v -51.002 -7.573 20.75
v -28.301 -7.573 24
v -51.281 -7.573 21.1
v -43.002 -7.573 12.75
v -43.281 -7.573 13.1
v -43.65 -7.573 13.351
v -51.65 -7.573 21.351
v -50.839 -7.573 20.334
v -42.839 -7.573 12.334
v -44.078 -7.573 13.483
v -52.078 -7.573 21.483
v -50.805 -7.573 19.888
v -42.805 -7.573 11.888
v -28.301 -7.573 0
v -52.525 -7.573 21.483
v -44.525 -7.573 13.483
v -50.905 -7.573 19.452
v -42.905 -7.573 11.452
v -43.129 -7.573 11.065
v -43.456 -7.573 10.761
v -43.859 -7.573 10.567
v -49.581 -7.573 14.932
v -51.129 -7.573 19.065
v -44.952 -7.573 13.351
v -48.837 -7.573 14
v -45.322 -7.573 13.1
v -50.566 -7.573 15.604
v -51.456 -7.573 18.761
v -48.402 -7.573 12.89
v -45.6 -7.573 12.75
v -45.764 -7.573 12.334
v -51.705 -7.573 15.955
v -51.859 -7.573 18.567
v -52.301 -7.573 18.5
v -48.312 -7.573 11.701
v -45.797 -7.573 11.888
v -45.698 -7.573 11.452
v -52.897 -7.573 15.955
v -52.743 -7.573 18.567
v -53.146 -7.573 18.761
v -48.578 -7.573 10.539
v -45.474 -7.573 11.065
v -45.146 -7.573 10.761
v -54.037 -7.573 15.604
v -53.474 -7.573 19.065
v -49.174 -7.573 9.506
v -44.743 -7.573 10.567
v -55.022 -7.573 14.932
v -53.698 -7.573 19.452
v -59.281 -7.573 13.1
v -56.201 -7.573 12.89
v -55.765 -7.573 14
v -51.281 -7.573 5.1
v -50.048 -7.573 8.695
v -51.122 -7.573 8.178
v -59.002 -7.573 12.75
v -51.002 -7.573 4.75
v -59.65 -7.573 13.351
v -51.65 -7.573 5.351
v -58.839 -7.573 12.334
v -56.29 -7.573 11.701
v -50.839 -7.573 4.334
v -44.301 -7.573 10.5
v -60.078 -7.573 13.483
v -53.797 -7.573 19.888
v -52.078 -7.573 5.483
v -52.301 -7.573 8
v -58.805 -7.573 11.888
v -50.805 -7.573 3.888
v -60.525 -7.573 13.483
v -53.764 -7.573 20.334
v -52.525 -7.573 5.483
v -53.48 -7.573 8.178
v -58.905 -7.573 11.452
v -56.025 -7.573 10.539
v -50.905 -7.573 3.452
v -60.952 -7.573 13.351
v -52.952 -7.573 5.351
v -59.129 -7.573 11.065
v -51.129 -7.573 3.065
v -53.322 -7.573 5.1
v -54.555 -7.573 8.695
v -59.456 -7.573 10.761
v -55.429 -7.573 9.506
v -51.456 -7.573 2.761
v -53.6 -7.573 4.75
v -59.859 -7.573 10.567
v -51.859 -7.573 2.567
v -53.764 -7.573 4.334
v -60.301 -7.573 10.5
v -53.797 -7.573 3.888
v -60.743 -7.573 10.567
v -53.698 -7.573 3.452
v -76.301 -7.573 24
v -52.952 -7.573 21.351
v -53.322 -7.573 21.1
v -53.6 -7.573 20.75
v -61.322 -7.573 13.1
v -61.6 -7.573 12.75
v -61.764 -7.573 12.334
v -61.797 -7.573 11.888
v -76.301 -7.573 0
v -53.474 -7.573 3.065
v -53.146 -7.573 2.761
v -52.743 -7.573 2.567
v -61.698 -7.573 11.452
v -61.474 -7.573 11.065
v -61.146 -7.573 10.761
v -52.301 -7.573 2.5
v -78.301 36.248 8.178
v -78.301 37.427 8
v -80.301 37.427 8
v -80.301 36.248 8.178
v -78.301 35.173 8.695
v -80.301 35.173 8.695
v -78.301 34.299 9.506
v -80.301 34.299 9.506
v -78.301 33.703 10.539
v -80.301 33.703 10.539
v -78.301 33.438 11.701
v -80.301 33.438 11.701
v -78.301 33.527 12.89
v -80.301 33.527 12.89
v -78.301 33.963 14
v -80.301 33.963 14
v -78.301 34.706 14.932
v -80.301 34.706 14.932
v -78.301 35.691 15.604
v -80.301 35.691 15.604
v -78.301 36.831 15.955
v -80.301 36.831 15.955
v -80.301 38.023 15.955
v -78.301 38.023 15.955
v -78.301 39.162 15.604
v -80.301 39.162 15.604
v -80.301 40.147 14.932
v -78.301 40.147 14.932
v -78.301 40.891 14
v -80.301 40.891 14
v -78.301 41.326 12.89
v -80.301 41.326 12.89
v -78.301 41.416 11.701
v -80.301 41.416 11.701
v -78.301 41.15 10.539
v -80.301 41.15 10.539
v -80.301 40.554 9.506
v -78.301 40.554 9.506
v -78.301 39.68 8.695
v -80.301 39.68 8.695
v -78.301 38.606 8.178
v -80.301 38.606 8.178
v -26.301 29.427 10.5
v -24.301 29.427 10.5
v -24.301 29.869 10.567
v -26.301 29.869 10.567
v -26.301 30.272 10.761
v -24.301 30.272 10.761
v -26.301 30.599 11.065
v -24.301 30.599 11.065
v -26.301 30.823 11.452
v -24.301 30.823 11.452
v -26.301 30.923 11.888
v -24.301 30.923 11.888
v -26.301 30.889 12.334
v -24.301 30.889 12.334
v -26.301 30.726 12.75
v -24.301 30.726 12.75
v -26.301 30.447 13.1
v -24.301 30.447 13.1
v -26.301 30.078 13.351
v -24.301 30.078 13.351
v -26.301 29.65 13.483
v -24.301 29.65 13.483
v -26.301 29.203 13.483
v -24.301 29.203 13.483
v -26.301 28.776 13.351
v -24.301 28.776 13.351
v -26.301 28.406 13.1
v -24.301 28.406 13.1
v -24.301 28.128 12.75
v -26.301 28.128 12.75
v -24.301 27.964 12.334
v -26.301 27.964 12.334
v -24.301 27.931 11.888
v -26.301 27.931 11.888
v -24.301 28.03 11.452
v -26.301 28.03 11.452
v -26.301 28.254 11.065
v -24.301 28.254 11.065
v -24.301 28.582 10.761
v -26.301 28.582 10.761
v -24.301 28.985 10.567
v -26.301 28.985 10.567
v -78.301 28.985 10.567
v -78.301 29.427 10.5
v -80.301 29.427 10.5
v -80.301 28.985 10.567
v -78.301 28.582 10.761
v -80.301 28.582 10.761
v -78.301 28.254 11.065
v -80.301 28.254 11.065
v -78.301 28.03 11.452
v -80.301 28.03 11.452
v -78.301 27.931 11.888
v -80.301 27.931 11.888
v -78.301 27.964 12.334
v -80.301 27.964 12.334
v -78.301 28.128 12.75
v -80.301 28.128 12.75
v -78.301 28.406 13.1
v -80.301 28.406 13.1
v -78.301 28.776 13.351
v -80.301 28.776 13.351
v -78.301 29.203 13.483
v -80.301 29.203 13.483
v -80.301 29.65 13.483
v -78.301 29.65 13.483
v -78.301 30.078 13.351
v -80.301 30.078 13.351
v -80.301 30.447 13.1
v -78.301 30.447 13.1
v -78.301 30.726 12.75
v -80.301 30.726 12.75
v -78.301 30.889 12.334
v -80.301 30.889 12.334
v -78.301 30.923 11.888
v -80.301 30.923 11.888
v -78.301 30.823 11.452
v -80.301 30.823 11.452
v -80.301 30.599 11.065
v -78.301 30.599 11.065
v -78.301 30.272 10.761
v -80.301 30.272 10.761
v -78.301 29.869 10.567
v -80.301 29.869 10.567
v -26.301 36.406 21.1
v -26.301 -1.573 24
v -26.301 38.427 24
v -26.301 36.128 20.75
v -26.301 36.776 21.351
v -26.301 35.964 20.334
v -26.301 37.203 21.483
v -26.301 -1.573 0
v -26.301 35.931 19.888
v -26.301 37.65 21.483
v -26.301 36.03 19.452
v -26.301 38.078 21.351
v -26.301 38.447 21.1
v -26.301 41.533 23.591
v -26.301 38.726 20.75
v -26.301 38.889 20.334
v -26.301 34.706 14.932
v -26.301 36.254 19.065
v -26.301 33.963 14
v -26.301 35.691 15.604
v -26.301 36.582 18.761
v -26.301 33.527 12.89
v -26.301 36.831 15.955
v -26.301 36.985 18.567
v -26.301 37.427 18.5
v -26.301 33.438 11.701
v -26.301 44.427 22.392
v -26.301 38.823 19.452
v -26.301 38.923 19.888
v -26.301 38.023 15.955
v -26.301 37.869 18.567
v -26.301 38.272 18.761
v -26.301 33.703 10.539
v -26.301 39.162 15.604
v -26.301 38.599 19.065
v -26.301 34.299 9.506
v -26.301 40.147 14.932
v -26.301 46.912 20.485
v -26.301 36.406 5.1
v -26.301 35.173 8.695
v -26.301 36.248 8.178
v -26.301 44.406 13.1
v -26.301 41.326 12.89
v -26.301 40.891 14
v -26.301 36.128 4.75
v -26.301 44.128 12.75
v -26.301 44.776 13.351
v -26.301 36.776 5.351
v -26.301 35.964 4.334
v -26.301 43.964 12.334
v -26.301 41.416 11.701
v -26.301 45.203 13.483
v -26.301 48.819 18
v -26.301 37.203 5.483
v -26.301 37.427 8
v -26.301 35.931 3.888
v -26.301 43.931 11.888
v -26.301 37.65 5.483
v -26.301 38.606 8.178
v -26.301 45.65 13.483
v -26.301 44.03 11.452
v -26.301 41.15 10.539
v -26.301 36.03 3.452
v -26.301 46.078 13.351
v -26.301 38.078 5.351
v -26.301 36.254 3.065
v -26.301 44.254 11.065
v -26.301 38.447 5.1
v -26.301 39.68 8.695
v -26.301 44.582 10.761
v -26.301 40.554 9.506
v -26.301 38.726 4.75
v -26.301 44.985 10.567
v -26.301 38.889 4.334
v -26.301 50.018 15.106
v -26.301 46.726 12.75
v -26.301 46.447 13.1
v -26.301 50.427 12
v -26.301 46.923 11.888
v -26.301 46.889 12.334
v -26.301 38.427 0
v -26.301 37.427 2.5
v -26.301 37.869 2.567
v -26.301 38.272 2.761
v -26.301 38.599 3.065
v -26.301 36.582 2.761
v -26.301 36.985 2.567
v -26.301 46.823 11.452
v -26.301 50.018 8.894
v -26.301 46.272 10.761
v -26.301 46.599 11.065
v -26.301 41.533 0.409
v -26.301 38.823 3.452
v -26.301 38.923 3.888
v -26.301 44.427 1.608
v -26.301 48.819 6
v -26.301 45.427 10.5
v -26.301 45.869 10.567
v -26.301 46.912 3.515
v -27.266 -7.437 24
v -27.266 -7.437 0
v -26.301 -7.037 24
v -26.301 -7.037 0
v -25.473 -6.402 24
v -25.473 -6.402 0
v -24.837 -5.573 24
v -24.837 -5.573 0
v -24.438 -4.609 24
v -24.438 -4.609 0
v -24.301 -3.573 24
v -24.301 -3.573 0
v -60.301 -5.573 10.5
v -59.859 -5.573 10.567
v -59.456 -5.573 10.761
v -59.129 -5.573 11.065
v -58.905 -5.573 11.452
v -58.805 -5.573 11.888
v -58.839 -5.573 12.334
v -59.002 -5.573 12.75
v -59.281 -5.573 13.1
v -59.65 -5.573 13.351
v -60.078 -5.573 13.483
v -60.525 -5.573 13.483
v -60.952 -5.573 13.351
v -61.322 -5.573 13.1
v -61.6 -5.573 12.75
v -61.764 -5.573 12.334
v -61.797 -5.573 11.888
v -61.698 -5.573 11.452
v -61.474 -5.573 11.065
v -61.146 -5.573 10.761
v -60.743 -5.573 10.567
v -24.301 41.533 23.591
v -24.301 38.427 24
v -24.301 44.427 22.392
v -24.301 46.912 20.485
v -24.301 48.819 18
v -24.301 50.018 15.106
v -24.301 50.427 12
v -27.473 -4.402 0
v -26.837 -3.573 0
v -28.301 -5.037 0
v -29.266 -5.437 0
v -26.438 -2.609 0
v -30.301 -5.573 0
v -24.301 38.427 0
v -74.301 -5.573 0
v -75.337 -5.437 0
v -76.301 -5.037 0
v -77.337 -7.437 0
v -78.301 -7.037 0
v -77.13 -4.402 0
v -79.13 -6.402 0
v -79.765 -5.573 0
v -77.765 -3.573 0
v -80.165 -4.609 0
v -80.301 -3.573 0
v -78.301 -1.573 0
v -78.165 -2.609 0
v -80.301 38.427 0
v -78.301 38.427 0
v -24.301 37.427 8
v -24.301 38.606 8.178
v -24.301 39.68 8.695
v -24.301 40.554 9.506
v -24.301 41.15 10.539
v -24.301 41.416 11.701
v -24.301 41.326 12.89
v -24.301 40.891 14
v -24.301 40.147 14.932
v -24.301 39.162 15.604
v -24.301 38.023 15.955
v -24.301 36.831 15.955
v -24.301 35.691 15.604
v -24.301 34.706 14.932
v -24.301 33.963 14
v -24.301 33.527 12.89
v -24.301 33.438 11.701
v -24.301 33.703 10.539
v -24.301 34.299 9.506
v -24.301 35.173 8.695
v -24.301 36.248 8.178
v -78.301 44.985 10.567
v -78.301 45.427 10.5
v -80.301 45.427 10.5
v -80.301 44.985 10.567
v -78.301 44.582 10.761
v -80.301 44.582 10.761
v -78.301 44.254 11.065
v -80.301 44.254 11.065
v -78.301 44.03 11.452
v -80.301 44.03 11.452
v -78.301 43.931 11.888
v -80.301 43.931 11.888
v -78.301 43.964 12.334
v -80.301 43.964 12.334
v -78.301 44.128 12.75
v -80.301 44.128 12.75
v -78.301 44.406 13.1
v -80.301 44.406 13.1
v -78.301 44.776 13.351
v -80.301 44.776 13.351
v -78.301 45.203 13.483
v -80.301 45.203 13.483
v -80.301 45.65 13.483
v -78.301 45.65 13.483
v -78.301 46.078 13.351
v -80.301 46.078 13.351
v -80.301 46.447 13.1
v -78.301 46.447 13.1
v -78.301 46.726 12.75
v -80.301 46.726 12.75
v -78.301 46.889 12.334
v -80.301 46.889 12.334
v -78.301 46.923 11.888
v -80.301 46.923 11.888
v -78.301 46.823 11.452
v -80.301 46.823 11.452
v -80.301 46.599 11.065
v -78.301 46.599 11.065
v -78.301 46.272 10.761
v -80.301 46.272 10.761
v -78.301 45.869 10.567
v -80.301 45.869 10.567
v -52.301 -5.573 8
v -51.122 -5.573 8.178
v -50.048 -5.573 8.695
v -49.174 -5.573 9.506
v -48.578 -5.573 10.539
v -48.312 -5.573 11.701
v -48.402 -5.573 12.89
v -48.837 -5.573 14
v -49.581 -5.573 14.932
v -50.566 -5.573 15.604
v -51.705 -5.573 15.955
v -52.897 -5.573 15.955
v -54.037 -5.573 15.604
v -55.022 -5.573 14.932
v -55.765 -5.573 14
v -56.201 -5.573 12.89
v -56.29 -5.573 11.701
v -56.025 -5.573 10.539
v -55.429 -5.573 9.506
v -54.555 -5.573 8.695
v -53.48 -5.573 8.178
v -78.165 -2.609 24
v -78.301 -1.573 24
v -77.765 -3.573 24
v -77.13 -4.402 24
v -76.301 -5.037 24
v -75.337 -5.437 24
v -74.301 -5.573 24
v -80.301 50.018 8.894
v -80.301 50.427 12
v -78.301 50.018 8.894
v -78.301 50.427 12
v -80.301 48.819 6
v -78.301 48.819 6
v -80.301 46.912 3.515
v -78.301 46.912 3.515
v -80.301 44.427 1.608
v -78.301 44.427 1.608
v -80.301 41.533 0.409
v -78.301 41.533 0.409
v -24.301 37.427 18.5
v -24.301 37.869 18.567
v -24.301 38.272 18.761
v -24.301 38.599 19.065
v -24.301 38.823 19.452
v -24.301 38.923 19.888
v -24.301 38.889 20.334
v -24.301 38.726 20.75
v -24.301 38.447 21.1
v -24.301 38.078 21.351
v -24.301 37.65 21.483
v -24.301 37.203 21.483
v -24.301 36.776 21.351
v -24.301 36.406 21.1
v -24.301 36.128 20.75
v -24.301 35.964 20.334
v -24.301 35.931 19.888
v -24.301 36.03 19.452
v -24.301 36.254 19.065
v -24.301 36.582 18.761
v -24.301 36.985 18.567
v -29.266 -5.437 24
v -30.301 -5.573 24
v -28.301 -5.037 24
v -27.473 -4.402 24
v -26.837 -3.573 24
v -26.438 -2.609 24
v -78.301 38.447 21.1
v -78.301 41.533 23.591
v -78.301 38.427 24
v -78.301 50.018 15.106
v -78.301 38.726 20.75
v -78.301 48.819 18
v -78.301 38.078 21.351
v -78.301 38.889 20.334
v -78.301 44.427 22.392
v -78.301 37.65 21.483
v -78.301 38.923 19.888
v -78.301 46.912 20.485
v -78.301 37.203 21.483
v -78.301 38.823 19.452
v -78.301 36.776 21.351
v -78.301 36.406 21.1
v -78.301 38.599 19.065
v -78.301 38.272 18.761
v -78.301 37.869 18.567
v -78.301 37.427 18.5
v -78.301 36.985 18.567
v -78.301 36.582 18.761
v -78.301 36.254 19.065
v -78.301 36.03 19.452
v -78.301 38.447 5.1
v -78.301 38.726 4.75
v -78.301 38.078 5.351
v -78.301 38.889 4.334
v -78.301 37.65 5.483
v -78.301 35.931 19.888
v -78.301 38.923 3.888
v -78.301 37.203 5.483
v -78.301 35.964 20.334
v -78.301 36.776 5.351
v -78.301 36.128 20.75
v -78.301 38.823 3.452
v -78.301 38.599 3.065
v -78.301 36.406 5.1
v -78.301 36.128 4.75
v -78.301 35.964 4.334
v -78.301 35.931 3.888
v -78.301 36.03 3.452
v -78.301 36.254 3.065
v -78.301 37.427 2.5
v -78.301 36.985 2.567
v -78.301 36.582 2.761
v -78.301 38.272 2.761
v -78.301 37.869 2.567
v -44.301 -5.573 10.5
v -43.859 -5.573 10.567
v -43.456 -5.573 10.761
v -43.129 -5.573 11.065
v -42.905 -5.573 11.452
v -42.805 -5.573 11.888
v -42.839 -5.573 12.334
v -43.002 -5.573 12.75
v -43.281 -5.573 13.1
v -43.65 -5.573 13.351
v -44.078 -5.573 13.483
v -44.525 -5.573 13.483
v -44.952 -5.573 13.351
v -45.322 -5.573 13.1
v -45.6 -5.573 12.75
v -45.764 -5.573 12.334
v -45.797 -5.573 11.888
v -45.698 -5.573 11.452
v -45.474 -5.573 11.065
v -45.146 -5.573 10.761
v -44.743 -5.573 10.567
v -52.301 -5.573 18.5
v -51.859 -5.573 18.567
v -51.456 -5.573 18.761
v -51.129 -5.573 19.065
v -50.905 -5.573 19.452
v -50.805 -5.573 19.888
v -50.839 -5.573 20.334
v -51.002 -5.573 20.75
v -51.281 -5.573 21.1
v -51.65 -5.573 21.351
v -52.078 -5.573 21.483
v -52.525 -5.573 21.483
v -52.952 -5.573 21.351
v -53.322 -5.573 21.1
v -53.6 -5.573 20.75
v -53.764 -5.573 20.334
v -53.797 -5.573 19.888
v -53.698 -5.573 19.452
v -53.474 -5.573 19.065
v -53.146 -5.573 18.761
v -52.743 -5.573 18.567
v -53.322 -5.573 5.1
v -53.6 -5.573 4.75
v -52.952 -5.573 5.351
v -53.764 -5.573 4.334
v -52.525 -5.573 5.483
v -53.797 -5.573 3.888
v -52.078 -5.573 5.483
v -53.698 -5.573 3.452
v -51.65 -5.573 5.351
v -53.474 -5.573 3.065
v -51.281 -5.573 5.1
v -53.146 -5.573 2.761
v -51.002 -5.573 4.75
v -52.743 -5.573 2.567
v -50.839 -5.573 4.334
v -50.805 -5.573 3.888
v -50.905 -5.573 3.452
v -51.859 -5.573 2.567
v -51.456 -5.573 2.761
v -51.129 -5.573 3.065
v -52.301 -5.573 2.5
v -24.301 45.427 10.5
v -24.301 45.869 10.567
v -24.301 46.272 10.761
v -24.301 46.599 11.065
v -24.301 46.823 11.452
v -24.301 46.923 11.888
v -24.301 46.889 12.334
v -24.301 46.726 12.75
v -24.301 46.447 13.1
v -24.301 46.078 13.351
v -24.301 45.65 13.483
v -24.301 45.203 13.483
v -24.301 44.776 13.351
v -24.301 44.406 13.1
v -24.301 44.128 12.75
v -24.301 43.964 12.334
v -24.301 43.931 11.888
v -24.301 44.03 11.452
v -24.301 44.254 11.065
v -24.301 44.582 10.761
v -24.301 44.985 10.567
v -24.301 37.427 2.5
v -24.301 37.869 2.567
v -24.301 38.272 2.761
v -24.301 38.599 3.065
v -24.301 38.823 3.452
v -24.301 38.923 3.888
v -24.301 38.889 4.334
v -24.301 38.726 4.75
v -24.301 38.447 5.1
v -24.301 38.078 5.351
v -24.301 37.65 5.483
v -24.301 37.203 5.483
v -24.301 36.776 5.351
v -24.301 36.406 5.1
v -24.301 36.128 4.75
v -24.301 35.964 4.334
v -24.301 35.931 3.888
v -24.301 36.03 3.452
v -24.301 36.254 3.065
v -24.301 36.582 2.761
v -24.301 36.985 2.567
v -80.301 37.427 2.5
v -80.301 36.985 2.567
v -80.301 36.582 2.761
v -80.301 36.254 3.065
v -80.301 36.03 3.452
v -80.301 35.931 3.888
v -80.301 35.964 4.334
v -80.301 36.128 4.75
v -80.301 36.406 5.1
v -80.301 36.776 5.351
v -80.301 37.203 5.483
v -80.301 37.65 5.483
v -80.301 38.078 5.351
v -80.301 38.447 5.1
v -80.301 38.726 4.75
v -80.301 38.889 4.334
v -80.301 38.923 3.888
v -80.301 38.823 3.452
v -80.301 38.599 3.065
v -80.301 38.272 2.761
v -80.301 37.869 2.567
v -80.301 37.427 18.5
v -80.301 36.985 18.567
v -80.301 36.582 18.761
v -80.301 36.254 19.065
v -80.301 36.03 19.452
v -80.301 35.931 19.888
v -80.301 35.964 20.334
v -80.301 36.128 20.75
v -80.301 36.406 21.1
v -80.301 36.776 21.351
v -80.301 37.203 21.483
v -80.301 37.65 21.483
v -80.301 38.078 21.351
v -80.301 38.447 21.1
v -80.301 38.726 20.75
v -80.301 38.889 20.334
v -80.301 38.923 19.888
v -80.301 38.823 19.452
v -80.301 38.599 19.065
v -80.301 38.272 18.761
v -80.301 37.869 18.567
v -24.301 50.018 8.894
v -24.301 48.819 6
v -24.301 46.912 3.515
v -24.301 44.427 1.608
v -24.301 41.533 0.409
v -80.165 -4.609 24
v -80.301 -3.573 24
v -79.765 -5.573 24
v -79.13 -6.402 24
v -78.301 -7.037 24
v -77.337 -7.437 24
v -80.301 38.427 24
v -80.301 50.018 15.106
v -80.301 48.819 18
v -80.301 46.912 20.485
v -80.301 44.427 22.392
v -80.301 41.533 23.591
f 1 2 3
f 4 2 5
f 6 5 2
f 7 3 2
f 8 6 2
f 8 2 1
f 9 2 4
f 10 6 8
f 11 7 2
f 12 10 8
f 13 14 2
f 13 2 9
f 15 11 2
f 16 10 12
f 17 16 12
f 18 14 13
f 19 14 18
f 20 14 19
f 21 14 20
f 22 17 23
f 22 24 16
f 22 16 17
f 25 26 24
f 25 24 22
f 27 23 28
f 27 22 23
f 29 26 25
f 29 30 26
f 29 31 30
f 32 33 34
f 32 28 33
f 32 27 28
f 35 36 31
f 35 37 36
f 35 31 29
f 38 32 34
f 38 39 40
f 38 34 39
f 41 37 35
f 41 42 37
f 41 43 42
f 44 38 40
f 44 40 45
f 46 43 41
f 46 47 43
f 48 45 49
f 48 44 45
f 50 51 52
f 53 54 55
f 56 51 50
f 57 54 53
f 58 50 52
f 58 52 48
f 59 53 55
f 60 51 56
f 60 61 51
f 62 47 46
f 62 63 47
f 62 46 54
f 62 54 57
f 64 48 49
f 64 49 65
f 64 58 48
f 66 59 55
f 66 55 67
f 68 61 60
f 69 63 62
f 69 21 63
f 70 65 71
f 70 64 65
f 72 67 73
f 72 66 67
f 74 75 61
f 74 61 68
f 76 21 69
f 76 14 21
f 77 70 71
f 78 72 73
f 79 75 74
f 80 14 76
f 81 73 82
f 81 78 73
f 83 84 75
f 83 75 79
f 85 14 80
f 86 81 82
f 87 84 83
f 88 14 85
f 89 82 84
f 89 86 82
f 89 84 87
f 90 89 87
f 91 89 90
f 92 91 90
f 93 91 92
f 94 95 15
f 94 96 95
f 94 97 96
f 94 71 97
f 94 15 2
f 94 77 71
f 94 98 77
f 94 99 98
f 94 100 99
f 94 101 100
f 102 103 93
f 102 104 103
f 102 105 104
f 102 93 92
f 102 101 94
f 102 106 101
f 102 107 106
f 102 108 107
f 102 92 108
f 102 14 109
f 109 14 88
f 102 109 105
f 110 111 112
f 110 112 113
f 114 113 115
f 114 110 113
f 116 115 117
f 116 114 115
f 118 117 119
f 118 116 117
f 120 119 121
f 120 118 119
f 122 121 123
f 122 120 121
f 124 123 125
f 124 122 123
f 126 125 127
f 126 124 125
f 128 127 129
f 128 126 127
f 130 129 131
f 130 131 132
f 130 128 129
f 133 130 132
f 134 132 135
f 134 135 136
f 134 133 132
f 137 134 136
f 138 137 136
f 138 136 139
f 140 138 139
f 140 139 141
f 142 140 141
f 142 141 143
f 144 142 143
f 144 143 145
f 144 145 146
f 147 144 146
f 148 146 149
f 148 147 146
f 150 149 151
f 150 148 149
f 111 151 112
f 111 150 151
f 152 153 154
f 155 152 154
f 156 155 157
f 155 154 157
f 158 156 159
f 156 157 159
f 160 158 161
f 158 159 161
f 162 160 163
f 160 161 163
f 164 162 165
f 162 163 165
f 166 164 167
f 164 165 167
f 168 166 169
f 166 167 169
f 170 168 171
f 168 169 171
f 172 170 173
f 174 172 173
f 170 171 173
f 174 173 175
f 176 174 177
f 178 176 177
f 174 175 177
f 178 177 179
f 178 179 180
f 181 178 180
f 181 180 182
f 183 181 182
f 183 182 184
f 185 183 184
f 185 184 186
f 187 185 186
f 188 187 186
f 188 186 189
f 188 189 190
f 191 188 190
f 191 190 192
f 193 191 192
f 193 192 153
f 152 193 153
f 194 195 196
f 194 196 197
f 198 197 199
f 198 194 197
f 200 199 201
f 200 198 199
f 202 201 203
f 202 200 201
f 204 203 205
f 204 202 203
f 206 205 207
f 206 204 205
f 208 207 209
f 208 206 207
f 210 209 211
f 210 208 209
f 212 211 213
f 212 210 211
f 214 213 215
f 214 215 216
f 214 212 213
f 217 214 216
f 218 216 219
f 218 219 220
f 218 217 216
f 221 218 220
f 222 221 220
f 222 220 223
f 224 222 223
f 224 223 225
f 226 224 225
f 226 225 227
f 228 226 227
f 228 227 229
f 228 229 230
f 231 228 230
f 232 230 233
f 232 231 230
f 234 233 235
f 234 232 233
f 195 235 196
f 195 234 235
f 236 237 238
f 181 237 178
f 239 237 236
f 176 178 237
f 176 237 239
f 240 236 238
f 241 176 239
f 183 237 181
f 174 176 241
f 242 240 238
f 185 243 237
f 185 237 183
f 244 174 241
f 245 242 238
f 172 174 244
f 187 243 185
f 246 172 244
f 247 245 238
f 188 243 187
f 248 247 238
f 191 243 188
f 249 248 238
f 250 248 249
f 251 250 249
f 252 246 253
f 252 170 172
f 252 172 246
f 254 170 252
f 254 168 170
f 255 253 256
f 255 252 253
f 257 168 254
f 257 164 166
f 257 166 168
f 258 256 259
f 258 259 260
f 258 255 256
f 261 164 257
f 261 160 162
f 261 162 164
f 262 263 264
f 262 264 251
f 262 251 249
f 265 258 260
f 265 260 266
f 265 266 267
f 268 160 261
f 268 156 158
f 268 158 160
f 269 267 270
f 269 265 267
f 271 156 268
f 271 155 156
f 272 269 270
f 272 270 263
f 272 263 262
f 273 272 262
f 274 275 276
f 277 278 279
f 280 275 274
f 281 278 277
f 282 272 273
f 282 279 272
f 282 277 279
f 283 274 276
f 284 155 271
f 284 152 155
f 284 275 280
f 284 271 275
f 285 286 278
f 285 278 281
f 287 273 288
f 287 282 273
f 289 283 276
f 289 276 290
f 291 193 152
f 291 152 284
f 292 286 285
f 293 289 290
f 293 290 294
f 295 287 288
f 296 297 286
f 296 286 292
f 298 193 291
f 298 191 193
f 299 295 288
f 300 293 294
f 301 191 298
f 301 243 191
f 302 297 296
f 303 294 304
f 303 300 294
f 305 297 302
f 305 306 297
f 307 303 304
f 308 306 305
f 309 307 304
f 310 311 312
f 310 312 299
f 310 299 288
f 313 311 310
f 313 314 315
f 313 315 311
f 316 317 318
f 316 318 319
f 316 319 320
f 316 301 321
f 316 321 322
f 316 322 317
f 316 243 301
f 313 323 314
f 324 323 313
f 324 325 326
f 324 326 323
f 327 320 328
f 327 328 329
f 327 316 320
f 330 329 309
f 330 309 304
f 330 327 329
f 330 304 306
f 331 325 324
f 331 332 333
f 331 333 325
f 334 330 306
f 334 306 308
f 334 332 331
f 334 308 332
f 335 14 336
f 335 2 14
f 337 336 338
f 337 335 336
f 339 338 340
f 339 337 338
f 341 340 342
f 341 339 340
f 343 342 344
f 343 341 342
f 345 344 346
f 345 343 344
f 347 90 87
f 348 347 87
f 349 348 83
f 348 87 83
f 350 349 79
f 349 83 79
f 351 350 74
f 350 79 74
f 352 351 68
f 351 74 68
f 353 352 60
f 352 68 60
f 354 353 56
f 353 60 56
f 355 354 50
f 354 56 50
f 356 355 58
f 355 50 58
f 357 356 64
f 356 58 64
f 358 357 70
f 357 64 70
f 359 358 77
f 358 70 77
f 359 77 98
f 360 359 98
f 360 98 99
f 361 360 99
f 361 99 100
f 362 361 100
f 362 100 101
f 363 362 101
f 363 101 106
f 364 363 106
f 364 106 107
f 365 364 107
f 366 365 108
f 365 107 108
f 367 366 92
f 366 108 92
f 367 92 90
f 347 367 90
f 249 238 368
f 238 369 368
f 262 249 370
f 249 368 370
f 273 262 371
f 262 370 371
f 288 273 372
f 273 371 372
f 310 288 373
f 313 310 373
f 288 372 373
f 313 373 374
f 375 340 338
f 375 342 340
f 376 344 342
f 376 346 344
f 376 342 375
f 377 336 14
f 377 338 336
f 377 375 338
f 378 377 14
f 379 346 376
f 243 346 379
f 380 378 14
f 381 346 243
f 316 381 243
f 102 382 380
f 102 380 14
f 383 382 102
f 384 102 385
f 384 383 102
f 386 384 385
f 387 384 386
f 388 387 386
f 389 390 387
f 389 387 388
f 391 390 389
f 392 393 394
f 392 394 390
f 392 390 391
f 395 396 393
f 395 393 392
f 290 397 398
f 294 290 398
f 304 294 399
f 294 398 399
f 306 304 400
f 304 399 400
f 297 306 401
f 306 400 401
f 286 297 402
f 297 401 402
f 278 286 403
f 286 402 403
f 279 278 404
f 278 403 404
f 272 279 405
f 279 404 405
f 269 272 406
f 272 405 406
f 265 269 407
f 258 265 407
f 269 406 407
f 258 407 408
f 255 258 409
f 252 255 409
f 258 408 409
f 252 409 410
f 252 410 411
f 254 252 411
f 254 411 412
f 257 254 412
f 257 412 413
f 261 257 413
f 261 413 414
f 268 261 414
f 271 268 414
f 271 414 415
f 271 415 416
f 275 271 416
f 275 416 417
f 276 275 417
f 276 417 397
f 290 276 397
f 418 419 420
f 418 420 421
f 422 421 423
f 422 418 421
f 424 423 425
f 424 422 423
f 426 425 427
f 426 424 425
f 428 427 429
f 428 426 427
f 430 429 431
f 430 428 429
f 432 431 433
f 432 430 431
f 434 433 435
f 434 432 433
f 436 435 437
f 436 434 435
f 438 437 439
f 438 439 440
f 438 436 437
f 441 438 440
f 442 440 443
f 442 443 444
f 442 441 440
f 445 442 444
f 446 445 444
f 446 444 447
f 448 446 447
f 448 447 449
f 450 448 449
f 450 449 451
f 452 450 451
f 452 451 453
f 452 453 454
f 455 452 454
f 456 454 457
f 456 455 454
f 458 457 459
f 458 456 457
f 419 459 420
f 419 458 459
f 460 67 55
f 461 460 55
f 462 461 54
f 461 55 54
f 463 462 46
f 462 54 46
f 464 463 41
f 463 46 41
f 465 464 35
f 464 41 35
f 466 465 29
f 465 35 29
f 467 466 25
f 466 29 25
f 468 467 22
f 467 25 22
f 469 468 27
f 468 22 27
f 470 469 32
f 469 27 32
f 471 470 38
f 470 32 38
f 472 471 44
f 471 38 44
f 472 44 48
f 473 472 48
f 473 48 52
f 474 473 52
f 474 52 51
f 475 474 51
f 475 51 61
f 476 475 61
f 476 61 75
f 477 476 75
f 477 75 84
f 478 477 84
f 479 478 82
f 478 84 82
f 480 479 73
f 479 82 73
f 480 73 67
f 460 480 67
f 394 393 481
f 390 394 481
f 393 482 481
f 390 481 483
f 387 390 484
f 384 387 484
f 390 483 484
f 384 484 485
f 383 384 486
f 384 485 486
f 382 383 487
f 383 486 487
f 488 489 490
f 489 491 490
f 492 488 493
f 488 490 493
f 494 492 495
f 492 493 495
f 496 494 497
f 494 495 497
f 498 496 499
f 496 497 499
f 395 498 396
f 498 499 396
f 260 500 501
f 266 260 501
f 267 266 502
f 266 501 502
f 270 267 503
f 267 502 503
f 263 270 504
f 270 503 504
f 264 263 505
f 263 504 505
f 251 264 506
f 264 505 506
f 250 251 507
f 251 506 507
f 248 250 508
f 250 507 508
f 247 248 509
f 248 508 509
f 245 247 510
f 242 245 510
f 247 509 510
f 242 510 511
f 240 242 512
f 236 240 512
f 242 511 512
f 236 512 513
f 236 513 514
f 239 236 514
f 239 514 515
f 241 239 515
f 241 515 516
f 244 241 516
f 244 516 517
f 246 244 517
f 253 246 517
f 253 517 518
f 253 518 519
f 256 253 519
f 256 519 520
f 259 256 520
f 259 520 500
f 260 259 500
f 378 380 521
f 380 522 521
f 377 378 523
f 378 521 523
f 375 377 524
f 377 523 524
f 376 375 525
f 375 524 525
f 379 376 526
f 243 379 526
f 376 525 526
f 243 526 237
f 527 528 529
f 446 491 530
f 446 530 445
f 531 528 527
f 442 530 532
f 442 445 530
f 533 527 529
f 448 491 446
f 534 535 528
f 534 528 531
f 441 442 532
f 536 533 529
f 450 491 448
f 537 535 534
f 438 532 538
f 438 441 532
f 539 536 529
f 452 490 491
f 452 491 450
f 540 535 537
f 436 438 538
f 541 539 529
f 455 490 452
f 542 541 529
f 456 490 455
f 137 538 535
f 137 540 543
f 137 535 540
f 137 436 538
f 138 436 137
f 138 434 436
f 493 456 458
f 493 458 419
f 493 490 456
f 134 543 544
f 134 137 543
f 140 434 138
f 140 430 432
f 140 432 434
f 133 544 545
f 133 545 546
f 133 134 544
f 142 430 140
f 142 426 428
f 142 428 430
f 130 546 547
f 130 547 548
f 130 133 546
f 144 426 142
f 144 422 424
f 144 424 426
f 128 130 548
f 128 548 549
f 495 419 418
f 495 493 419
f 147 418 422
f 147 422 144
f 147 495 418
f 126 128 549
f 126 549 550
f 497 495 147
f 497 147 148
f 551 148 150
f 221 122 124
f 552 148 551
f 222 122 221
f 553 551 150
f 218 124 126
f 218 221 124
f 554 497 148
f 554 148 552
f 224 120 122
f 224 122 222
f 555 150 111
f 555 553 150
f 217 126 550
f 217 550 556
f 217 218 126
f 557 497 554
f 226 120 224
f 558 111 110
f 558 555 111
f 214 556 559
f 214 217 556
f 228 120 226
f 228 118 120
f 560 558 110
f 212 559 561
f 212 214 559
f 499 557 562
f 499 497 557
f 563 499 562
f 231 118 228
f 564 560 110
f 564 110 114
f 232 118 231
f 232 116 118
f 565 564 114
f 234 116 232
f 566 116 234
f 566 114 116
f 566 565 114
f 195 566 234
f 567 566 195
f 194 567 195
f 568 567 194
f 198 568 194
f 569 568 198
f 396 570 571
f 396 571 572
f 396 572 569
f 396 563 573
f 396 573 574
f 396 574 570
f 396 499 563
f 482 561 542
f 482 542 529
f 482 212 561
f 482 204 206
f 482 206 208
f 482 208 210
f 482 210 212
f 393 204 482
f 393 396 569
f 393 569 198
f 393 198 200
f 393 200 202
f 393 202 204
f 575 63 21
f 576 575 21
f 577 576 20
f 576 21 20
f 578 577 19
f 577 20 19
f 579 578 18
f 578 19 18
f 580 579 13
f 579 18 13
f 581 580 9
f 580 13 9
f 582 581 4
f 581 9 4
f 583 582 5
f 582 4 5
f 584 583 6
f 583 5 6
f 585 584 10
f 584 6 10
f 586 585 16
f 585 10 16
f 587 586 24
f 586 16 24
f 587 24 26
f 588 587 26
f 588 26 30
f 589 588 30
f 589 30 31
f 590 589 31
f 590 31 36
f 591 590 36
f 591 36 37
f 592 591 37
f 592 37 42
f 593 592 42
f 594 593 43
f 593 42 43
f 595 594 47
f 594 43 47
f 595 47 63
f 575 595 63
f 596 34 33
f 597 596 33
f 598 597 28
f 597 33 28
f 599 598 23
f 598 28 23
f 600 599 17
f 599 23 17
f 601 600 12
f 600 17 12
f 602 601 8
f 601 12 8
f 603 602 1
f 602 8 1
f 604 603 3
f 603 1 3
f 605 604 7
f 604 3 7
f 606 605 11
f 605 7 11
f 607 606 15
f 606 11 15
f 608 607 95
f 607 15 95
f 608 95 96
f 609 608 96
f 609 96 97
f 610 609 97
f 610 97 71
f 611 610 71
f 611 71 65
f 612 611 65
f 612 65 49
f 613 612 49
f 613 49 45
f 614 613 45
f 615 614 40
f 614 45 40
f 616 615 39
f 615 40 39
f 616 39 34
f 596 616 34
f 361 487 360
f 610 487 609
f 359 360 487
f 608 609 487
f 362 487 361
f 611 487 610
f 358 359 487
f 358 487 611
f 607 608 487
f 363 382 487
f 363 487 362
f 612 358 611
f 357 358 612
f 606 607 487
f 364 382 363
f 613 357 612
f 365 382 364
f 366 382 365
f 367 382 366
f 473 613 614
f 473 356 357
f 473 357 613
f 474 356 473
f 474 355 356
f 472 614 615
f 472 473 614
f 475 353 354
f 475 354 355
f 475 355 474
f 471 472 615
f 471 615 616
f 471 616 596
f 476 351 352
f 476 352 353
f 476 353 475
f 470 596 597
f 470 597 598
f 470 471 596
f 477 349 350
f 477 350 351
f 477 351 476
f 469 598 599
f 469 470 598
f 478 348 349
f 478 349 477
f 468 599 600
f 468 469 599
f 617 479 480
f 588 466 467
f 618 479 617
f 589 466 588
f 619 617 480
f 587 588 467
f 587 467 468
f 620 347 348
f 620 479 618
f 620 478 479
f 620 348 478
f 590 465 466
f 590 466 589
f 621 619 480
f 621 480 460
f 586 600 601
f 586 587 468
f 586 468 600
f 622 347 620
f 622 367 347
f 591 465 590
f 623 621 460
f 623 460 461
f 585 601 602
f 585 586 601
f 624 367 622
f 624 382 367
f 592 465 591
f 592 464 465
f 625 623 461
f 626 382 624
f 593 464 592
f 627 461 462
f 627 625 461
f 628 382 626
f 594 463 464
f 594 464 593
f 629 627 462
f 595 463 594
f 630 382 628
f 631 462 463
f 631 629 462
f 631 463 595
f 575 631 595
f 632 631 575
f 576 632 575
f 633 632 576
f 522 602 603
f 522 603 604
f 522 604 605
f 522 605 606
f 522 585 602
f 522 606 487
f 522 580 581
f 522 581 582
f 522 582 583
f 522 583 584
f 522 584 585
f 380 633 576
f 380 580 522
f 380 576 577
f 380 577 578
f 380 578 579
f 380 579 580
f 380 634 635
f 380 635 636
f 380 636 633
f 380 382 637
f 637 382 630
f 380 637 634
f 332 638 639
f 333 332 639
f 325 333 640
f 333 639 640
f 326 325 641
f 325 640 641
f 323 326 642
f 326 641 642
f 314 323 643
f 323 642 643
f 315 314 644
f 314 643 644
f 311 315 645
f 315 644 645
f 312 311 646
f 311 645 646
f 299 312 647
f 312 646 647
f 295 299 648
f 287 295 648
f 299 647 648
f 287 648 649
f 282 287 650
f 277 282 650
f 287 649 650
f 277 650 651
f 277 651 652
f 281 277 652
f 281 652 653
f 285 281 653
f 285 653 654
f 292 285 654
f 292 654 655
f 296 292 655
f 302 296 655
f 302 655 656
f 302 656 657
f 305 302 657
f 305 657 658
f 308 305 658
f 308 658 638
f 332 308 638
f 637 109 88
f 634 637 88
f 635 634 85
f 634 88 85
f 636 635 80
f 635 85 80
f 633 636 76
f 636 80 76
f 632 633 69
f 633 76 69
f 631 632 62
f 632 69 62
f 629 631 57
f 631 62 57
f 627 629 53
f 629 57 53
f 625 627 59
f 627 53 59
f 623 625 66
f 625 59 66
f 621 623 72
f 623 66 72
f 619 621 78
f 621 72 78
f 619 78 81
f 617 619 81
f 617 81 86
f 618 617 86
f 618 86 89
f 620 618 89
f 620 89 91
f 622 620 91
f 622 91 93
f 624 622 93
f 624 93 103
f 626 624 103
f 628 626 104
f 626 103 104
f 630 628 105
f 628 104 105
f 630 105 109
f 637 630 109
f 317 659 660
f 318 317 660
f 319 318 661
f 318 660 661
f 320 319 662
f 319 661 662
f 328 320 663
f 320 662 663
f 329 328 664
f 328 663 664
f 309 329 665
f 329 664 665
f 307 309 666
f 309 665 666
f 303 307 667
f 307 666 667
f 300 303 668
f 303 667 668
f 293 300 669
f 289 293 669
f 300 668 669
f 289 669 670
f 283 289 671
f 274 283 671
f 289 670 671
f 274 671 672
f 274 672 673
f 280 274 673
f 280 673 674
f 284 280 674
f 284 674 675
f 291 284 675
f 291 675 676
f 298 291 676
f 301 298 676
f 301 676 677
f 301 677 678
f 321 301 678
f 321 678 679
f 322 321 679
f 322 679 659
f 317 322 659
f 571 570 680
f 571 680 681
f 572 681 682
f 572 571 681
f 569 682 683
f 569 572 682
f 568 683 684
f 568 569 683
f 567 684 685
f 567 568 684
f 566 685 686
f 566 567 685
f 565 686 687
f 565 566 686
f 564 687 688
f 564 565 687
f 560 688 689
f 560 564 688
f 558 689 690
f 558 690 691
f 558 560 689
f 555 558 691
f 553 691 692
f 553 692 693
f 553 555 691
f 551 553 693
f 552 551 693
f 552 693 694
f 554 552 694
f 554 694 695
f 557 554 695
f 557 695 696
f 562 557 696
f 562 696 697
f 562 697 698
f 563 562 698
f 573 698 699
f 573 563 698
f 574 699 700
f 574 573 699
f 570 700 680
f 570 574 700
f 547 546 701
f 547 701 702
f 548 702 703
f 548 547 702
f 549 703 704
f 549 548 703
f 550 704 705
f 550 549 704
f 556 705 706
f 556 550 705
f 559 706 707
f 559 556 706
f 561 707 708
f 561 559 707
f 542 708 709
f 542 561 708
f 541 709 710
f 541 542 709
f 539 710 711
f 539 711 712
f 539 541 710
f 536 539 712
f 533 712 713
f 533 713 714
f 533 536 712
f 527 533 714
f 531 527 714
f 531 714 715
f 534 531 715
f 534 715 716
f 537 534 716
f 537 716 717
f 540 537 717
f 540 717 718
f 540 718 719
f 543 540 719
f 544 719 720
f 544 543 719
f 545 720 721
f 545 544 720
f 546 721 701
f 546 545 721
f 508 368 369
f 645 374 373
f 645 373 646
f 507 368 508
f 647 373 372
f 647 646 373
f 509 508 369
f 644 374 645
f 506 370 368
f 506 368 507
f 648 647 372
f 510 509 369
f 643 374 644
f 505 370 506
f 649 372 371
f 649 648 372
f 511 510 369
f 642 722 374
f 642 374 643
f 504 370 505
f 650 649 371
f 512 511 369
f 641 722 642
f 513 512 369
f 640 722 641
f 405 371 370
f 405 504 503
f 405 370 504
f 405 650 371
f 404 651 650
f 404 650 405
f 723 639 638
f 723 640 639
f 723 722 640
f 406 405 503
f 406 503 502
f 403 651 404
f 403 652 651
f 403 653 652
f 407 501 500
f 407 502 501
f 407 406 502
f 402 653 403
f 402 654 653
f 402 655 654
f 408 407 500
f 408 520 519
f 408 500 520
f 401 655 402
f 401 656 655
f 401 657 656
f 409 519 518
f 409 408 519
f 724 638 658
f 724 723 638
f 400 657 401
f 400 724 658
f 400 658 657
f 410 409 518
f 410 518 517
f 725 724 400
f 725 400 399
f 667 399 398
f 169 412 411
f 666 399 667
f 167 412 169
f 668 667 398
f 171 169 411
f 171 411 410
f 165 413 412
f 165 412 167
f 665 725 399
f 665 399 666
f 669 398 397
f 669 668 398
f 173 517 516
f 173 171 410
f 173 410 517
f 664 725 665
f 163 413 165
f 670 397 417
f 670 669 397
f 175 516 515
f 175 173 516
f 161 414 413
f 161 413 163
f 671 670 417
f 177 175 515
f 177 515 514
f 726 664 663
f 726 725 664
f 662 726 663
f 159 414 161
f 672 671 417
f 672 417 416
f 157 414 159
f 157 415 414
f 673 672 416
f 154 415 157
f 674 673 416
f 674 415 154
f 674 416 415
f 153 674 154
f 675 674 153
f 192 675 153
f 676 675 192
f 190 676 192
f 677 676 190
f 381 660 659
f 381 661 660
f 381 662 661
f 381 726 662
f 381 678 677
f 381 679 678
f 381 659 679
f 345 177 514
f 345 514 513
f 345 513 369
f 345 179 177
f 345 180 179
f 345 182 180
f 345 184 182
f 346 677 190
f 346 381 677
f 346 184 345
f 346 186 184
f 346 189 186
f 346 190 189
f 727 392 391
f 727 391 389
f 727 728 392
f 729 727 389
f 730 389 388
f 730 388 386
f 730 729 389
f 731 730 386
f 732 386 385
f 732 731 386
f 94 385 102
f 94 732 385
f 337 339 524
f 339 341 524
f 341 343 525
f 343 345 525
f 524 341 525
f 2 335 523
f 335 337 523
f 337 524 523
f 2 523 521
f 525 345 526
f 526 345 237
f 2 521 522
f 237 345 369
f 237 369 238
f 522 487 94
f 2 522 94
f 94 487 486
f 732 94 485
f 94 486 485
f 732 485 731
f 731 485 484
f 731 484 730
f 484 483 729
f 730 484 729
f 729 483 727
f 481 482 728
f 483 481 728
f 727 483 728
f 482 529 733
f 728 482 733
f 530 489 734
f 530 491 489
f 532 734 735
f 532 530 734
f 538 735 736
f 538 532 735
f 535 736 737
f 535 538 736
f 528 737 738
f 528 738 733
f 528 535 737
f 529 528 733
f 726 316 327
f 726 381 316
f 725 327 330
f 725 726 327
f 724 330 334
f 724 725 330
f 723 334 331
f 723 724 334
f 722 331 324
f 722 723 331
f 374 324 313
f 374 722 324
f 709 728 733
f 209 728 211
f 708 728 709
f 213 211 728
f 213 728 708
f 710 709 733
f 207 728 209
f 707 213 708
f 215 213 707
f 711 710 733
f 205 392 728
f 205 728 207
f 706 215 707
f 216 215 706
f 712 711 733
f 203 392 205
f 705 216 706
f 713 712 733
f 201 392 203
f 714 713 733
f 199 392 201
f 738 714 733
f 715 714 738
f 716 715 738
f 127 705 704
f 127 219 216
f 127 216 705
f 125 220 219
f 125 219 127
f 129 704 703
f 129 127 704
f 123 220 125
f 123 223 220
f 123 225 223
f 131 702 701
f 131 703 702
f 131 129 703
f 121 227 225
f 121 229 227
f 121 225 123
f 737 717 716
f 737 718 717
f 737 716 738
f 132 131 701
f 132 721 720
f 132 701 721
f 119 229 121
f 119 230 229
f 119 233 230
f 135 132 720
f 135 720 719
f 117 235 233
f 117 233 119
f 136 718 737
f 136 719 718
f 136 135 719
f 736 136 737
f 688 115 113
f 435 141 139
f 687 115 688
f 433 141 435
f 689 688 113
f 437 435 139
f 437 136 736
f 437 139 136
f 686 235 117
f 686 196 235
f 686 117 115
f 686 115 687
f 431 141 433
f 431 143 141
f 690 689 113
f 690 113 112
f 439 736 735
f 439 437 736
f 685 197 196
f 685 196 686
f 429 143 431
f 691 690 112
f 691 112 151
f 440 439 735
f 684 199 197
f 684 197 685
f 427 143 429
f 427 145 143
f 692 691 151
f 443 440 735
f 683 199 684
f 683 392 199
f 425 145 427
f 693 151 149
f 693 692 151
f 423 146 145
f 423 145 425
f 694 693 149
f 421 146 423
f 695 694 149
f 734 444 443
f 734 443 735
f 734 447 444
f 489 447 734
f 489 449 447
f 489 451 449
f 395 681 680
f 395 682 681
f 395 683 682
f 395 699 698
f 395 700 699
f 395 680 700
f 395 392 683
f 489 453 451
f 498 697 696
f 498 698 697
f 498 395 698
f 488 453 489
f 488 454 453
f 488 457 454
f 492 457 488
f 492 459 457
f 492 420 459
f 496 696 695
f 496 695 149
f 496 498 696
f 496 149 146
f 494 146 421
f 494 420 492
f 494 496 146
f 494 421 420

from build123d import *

# Parameters (mm, degrees)
BOSS_EXTRUDE1_DEPTH = 24
SKETCH2_R           = 4
SKETCH2_R_2         = 1.5
CUT_EXTRUDE1_DEPTH  = 19
CUT_EXTRUDE2_START  = -2
SKETCH3_R           = 4
SKETCH3_R_2         = 1.5
CUT_EXTRUDE2_DEPTH  = 2
FILLET1_R           = 12
SKETCH4_R           = 1.5
SKETCH4_R_2         = 4
CUT_EXTRUDE4_DEPTH  = 2
FILLET2_R           = 4


with BuildPart() as part:
    # Sketch1 → Boss-Extrude1 (new body)
    with BuildSketch(Plane.XY):
        Polygon((-78.301300665, 50.426714514), (-78.301300665, -5.573285486), (-26.301300665, -5.573285486), (-26.301300665, 50.426714514), (-24.301300665, 50.426714514), (-24.301300665, -7.573285486), (-80.301300665, -7.573285486), (-80.301300665, 50.426714514), align=None)
    extrude(amount=BOSS_EXTRUDE1_DEPTH)

    # Sketch2 → Cut-Extrude1 (cut)
    with BuildSketch(Plane(origin=(-24.301300665, 0, 0), x_dir=(0, 0, -1), z_dir=(1, 0, 0))):
        with Locations((-12, 37.426714514)):
            Circle(SKETCH2_R)
        with Locations((-4, 37.426714514)):
            Circle(SKETCH2_R_2)
        with Locations((-12, 29.426714514)):
            Circle(SKETCH2_R_2)
        with Locations((-20, 37.426714514)):
            Circle(SKETCH2_R_2)
        with Locations((-12, 45.426714514)):
            Circle(SKETCH2_R_2)
    extrude(amount=-CUT_EXTRUDE1_DEPTH, mode=Mode.SUBTRACT)

    # Sketch3 → Cut-Extrude2 (cut)
    with BuildSketch(Plane.ZY.offset(80.301300665).offset(CUT_EXTRUDE2_START)):
        with Locations(Location((12, 37.426714514, 0), (0, 0, 180))):
            Circle(SKETCH3_R)
        with Locations(Location((20, 37.426714514, 0), (0, 0, 180))):
            Circle(SKETCH3_R_2)
        with Locations(Location((12, 29.426714514, 0), (0, 0, 180))):
            Circle(SKETCH3_R_2)
        with Locations(Location((4, 37.426714514, 0), (0, 0, 180))):
            Circle(SKETCH3_R_2)
        with Locations(Location((12, 45.426714514, 0), (0, 0, 180))):
            Circle(SKETCH3_R_2)
    extrude(amount=CUT_EXTRUDE2_DEPTH, mode=Mode.SUBTRACT)

    # Fillet1
    fillet1_edges = [part.edges().sort_by_distance(p)[0] for p in [
        (-25.301300665, 50.426714514, 0),
        (-79.301300665, 50.426714514, 0),
        (-79.301300665, 50.426714514, 24),
        (-25.301300665, 50.426714514, 24),
    ]]
    fillet(fillet1_edges, radius=FILLET1_R - 0.0001)  # a hair under: the kernel refuses the full size

    # Sketch4 → Cut-Extrude4 (cut)
    with BuildSketch(Plane.XZ.offset(7.573285486)):
        with Locations(Location((-44.301300665, 12, 0), (0, 0, 270))):
            Circle(SKETCH4_R)
        with Locations(Location((-52.301300665, 4, 0), (0, 0, 270))):
            Circle(SKETCH4_R)
        with Locations(Location((-60.301300665, 12, 0), (0, 0, 270))):
            Circle(SKETCH4_R)
        with Locations(Location((-52.301300665, 12, 0), (0, 0, 270))):
            Circle(SKETCH4_R_2)
        with Locations(Location((-52.301300665, 20, 0), (0, 0, 270))):
            Circle(SKETCH4_R)
    extrude(amount=-CUT_EXTRUDE4_DEPTH, mode=Mode.SUBTRACT)

    # Fillet2
    fillet2_edges = [part.edges().sort_by_distance(p)[0] for p in [
        (-78.301300665, -5.573285486, 12),
        (-26.301300665, -5.573285486, 12),
        (-24.301300665, -7.573285486, 12),
        (-80.301300665, -7.573285486, 12),
    ]]
    fillet(fillet2_edges, radius=FILLET2_R)


solid = part.part
